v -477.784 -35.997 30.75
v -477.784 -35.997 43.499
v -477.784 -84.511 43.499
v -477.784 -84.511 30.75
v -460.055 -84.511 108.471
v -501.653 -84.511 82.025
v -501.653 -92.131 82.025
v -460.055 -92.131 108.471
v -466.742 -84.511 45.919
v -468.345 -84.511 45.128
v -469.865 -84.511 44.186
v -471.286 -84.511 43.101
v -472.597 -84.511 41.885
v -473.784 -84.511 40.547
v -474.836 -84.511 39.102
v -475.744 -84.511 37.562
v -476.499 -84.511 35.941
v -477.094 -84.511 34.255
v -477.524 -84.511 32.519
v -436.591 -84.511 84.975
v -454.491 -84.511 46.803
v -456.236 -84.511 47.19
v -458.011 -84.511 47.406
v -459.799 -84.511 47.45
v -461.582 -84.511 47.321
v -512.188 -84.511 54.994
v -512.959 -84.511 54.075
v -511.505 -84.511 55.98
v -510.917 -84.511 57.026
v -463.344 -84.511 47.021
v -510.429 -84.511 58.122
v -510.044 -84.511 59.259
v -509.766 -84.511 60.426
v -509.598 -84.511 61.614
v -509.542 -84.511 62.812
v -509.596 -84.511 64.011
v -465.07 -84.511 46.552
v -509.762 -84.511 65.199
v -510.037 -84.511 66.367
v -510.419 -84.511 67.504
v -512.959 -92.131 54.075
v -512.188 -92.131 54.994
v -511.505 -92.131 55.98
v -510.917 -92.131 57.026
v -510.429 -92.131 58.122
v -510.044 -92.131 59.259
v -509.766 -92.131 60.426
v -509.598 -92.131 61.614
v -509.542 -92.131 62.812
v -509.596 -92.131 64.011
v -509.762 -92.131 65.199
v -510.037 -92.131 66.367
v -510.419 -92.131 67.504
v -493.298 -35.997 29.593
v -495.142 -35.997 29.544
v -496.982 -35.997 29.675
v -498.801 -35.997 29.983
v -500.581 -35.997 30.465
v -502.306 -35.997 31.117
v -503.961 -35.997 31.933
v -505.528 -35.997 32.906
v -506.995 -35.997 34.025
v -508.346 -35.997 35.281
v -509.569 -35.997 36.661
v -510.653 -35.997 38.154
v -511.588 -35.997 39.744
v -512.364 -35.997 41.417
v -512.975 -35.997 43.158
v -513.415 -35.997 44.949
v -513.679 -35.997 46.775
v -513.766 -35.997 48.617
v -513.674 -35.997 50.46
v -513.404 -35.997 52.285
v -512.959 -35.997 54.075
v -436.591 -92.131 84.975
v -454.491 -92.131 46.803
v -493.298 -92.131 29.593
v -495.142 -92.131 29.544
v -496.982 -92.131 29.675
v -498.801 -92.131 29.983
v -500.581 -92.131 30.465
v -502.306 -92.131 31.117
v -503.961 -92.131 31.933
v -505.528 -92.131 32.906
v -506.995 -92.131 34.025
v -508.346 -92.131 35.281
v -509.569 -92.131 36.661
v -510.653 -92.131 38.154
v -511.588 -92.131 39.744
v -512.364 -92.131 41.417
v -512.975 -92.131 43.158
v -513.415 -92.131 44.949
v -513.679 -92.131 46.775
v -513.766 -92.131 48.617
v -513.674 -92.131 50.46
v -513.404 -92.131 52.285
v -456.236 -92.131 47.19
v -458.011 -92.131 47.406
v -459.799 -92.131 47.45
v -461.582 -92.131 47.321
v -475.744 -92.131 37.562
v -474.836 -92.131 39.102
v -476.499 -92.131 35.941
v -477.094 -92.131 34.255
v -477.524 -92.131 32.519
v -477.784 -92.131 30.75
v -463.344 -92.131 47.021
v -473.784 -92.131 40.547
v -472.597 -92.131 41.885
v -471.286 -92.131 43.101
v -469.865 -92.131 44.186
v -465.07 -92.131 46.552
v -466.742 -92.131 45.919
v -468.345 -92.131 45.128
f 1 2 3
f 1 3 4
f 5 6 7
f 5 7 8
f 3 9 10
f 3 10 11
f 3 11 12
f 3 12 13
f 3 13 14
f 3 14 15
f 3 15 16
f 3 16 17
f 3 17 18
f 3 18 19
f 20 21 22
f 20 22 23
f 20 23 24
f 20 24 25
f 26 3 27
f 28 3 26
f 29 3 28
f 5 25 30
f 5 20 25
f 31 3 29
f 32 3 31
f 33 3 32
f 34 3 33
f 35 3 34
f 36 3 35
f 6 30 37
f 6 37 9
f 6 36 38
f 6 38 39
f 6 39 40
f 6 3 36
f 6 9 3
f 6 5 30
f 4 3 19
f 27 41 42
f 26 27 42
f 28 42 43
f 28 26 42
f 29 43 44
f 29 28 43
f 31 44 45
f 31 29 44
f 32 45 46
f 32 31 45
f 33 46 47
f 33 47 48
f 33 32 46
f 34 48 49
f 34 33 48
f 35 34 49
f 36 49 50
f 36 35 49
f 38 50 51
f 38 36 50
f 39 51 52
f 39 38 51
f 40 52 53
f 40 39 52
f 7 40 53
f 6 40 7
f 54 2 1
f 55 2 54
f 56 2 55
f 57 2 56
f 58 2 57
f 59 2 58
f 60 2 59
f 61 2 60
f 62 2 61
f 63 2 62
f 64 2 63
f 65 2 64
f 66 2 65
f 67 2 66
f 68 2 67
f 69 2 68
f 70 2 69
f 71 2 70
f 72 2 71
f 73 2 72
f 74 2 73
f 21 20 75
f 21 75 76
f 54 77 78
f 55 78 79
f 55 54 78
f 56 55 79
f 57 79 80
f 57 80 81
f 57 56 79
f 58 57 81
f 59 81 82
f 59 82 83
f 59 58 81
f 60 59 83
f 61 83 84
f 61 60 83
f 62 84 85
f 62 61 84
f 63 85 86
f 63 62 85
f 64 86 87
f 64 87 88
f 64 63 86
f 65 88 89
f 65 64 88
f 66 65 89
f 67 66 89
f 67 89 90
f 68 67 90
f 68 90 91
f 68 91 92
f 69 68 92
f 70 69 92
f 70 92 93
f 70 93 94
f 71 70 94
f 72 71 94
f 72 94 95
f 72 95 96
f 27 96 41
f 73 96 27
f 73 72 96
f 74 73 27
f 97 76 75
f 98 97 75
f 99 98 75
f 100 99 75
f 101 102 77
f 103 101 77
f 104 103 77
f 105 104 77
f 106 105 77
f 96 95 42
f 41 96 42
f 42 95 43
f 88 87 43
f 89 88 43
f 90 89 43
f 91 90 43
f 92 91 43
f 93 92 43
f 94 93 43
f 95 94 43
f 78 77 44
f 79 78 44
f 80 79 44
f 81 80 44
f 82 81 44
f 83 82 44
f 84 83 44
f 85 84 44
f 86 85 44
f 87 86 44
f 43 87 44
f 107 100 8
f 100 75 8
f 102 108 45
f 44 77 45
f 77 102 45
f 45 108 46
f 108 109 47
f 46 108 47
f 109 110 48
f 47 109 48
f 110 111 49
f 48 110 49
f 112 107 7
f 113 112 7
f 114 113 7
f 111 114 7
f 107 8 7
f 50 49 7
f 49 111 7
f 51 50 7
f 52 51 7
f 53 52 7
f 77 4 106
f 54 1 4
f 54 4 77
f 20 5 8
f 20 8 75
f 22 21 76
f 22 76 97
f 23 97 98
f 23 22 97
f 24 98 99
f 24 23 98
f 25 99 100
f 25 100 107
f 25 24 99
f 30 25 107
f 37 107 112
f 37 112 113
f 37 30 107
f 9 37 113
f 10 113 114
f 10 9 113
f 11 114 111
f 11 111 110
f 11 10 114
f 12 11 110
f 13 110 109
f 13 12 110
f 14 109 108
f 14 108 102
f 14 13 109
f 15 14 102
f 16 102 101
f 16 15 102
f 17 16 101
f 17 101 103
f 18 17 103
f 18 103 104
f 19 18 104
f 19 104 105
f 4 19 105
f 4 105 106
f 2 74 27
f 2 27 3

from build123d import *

# Parameters (mm, degrees)
BOSS_EXTRUDE1_DEPTH = 48.51400078
BOSS_EXTRUDE2_DEPTH = 7.62


with BuildPart() as part:
    # Sketch2 → Boss-Extrude1 (new body)
    with BuildSketch(Plane.XZ.offset(35.996799282)):
        with BuildLine():
            Line((-512.958981795, 54.074719549), (-477.784341144, 43.499133869))
            Line((-477.784341144, 43.499133869), (-477.784341144, 30.750375257))
            Line((-477.784341144, 30.750375257), (-493.297876549, 29.59254273))
            ThreePointArc((-493.297876549, 29.59254273), (-509.568926068, 36.66140776), (-512.958981795, 54.074719549))
        make_face()
    extrude(amount=BOSS_EXTRUDE1_DEPTH)

    # Sketch3 → Boss-Extrude2 (add)
    with BuildSketch(Plane.XZ.offset(84.510800062)):
        with BuildLine():
            Line((-460.055260418, 108.470724329), (-436.590512312, 84.974770196))
            Line((-436.590512312, 84.974770196), (-454.490518063, 46.803141976))
            ThreePointArc((-454.490518063, 46.803141976), (-469.864935435, 44.185661822), (-477.784341144, 30.750375257))
            Line((-477.784341144, 30.750375257), (-493.297876549, 29.59254273))
            ThreePointArc((-493.297876549, 29.59254273), (-509.568926068, 36.66140776), (-512.958981795, 54.074719549))
            ThreePointArc((-512.958981795, 54.074719549), (-509.76637554, 60.425881739), (-510.419261273, 67.504280999))
            Line((-510.419261273, 67.504280999), (-501.653310229, 82.024875489))
            Line((-501.653310229, 82.024875489), (-460.055260418, 108.470724329))
        make_face()
    extrude(amount=BOSS_EXTRUDE2_DEPTH)


solid = part.part
